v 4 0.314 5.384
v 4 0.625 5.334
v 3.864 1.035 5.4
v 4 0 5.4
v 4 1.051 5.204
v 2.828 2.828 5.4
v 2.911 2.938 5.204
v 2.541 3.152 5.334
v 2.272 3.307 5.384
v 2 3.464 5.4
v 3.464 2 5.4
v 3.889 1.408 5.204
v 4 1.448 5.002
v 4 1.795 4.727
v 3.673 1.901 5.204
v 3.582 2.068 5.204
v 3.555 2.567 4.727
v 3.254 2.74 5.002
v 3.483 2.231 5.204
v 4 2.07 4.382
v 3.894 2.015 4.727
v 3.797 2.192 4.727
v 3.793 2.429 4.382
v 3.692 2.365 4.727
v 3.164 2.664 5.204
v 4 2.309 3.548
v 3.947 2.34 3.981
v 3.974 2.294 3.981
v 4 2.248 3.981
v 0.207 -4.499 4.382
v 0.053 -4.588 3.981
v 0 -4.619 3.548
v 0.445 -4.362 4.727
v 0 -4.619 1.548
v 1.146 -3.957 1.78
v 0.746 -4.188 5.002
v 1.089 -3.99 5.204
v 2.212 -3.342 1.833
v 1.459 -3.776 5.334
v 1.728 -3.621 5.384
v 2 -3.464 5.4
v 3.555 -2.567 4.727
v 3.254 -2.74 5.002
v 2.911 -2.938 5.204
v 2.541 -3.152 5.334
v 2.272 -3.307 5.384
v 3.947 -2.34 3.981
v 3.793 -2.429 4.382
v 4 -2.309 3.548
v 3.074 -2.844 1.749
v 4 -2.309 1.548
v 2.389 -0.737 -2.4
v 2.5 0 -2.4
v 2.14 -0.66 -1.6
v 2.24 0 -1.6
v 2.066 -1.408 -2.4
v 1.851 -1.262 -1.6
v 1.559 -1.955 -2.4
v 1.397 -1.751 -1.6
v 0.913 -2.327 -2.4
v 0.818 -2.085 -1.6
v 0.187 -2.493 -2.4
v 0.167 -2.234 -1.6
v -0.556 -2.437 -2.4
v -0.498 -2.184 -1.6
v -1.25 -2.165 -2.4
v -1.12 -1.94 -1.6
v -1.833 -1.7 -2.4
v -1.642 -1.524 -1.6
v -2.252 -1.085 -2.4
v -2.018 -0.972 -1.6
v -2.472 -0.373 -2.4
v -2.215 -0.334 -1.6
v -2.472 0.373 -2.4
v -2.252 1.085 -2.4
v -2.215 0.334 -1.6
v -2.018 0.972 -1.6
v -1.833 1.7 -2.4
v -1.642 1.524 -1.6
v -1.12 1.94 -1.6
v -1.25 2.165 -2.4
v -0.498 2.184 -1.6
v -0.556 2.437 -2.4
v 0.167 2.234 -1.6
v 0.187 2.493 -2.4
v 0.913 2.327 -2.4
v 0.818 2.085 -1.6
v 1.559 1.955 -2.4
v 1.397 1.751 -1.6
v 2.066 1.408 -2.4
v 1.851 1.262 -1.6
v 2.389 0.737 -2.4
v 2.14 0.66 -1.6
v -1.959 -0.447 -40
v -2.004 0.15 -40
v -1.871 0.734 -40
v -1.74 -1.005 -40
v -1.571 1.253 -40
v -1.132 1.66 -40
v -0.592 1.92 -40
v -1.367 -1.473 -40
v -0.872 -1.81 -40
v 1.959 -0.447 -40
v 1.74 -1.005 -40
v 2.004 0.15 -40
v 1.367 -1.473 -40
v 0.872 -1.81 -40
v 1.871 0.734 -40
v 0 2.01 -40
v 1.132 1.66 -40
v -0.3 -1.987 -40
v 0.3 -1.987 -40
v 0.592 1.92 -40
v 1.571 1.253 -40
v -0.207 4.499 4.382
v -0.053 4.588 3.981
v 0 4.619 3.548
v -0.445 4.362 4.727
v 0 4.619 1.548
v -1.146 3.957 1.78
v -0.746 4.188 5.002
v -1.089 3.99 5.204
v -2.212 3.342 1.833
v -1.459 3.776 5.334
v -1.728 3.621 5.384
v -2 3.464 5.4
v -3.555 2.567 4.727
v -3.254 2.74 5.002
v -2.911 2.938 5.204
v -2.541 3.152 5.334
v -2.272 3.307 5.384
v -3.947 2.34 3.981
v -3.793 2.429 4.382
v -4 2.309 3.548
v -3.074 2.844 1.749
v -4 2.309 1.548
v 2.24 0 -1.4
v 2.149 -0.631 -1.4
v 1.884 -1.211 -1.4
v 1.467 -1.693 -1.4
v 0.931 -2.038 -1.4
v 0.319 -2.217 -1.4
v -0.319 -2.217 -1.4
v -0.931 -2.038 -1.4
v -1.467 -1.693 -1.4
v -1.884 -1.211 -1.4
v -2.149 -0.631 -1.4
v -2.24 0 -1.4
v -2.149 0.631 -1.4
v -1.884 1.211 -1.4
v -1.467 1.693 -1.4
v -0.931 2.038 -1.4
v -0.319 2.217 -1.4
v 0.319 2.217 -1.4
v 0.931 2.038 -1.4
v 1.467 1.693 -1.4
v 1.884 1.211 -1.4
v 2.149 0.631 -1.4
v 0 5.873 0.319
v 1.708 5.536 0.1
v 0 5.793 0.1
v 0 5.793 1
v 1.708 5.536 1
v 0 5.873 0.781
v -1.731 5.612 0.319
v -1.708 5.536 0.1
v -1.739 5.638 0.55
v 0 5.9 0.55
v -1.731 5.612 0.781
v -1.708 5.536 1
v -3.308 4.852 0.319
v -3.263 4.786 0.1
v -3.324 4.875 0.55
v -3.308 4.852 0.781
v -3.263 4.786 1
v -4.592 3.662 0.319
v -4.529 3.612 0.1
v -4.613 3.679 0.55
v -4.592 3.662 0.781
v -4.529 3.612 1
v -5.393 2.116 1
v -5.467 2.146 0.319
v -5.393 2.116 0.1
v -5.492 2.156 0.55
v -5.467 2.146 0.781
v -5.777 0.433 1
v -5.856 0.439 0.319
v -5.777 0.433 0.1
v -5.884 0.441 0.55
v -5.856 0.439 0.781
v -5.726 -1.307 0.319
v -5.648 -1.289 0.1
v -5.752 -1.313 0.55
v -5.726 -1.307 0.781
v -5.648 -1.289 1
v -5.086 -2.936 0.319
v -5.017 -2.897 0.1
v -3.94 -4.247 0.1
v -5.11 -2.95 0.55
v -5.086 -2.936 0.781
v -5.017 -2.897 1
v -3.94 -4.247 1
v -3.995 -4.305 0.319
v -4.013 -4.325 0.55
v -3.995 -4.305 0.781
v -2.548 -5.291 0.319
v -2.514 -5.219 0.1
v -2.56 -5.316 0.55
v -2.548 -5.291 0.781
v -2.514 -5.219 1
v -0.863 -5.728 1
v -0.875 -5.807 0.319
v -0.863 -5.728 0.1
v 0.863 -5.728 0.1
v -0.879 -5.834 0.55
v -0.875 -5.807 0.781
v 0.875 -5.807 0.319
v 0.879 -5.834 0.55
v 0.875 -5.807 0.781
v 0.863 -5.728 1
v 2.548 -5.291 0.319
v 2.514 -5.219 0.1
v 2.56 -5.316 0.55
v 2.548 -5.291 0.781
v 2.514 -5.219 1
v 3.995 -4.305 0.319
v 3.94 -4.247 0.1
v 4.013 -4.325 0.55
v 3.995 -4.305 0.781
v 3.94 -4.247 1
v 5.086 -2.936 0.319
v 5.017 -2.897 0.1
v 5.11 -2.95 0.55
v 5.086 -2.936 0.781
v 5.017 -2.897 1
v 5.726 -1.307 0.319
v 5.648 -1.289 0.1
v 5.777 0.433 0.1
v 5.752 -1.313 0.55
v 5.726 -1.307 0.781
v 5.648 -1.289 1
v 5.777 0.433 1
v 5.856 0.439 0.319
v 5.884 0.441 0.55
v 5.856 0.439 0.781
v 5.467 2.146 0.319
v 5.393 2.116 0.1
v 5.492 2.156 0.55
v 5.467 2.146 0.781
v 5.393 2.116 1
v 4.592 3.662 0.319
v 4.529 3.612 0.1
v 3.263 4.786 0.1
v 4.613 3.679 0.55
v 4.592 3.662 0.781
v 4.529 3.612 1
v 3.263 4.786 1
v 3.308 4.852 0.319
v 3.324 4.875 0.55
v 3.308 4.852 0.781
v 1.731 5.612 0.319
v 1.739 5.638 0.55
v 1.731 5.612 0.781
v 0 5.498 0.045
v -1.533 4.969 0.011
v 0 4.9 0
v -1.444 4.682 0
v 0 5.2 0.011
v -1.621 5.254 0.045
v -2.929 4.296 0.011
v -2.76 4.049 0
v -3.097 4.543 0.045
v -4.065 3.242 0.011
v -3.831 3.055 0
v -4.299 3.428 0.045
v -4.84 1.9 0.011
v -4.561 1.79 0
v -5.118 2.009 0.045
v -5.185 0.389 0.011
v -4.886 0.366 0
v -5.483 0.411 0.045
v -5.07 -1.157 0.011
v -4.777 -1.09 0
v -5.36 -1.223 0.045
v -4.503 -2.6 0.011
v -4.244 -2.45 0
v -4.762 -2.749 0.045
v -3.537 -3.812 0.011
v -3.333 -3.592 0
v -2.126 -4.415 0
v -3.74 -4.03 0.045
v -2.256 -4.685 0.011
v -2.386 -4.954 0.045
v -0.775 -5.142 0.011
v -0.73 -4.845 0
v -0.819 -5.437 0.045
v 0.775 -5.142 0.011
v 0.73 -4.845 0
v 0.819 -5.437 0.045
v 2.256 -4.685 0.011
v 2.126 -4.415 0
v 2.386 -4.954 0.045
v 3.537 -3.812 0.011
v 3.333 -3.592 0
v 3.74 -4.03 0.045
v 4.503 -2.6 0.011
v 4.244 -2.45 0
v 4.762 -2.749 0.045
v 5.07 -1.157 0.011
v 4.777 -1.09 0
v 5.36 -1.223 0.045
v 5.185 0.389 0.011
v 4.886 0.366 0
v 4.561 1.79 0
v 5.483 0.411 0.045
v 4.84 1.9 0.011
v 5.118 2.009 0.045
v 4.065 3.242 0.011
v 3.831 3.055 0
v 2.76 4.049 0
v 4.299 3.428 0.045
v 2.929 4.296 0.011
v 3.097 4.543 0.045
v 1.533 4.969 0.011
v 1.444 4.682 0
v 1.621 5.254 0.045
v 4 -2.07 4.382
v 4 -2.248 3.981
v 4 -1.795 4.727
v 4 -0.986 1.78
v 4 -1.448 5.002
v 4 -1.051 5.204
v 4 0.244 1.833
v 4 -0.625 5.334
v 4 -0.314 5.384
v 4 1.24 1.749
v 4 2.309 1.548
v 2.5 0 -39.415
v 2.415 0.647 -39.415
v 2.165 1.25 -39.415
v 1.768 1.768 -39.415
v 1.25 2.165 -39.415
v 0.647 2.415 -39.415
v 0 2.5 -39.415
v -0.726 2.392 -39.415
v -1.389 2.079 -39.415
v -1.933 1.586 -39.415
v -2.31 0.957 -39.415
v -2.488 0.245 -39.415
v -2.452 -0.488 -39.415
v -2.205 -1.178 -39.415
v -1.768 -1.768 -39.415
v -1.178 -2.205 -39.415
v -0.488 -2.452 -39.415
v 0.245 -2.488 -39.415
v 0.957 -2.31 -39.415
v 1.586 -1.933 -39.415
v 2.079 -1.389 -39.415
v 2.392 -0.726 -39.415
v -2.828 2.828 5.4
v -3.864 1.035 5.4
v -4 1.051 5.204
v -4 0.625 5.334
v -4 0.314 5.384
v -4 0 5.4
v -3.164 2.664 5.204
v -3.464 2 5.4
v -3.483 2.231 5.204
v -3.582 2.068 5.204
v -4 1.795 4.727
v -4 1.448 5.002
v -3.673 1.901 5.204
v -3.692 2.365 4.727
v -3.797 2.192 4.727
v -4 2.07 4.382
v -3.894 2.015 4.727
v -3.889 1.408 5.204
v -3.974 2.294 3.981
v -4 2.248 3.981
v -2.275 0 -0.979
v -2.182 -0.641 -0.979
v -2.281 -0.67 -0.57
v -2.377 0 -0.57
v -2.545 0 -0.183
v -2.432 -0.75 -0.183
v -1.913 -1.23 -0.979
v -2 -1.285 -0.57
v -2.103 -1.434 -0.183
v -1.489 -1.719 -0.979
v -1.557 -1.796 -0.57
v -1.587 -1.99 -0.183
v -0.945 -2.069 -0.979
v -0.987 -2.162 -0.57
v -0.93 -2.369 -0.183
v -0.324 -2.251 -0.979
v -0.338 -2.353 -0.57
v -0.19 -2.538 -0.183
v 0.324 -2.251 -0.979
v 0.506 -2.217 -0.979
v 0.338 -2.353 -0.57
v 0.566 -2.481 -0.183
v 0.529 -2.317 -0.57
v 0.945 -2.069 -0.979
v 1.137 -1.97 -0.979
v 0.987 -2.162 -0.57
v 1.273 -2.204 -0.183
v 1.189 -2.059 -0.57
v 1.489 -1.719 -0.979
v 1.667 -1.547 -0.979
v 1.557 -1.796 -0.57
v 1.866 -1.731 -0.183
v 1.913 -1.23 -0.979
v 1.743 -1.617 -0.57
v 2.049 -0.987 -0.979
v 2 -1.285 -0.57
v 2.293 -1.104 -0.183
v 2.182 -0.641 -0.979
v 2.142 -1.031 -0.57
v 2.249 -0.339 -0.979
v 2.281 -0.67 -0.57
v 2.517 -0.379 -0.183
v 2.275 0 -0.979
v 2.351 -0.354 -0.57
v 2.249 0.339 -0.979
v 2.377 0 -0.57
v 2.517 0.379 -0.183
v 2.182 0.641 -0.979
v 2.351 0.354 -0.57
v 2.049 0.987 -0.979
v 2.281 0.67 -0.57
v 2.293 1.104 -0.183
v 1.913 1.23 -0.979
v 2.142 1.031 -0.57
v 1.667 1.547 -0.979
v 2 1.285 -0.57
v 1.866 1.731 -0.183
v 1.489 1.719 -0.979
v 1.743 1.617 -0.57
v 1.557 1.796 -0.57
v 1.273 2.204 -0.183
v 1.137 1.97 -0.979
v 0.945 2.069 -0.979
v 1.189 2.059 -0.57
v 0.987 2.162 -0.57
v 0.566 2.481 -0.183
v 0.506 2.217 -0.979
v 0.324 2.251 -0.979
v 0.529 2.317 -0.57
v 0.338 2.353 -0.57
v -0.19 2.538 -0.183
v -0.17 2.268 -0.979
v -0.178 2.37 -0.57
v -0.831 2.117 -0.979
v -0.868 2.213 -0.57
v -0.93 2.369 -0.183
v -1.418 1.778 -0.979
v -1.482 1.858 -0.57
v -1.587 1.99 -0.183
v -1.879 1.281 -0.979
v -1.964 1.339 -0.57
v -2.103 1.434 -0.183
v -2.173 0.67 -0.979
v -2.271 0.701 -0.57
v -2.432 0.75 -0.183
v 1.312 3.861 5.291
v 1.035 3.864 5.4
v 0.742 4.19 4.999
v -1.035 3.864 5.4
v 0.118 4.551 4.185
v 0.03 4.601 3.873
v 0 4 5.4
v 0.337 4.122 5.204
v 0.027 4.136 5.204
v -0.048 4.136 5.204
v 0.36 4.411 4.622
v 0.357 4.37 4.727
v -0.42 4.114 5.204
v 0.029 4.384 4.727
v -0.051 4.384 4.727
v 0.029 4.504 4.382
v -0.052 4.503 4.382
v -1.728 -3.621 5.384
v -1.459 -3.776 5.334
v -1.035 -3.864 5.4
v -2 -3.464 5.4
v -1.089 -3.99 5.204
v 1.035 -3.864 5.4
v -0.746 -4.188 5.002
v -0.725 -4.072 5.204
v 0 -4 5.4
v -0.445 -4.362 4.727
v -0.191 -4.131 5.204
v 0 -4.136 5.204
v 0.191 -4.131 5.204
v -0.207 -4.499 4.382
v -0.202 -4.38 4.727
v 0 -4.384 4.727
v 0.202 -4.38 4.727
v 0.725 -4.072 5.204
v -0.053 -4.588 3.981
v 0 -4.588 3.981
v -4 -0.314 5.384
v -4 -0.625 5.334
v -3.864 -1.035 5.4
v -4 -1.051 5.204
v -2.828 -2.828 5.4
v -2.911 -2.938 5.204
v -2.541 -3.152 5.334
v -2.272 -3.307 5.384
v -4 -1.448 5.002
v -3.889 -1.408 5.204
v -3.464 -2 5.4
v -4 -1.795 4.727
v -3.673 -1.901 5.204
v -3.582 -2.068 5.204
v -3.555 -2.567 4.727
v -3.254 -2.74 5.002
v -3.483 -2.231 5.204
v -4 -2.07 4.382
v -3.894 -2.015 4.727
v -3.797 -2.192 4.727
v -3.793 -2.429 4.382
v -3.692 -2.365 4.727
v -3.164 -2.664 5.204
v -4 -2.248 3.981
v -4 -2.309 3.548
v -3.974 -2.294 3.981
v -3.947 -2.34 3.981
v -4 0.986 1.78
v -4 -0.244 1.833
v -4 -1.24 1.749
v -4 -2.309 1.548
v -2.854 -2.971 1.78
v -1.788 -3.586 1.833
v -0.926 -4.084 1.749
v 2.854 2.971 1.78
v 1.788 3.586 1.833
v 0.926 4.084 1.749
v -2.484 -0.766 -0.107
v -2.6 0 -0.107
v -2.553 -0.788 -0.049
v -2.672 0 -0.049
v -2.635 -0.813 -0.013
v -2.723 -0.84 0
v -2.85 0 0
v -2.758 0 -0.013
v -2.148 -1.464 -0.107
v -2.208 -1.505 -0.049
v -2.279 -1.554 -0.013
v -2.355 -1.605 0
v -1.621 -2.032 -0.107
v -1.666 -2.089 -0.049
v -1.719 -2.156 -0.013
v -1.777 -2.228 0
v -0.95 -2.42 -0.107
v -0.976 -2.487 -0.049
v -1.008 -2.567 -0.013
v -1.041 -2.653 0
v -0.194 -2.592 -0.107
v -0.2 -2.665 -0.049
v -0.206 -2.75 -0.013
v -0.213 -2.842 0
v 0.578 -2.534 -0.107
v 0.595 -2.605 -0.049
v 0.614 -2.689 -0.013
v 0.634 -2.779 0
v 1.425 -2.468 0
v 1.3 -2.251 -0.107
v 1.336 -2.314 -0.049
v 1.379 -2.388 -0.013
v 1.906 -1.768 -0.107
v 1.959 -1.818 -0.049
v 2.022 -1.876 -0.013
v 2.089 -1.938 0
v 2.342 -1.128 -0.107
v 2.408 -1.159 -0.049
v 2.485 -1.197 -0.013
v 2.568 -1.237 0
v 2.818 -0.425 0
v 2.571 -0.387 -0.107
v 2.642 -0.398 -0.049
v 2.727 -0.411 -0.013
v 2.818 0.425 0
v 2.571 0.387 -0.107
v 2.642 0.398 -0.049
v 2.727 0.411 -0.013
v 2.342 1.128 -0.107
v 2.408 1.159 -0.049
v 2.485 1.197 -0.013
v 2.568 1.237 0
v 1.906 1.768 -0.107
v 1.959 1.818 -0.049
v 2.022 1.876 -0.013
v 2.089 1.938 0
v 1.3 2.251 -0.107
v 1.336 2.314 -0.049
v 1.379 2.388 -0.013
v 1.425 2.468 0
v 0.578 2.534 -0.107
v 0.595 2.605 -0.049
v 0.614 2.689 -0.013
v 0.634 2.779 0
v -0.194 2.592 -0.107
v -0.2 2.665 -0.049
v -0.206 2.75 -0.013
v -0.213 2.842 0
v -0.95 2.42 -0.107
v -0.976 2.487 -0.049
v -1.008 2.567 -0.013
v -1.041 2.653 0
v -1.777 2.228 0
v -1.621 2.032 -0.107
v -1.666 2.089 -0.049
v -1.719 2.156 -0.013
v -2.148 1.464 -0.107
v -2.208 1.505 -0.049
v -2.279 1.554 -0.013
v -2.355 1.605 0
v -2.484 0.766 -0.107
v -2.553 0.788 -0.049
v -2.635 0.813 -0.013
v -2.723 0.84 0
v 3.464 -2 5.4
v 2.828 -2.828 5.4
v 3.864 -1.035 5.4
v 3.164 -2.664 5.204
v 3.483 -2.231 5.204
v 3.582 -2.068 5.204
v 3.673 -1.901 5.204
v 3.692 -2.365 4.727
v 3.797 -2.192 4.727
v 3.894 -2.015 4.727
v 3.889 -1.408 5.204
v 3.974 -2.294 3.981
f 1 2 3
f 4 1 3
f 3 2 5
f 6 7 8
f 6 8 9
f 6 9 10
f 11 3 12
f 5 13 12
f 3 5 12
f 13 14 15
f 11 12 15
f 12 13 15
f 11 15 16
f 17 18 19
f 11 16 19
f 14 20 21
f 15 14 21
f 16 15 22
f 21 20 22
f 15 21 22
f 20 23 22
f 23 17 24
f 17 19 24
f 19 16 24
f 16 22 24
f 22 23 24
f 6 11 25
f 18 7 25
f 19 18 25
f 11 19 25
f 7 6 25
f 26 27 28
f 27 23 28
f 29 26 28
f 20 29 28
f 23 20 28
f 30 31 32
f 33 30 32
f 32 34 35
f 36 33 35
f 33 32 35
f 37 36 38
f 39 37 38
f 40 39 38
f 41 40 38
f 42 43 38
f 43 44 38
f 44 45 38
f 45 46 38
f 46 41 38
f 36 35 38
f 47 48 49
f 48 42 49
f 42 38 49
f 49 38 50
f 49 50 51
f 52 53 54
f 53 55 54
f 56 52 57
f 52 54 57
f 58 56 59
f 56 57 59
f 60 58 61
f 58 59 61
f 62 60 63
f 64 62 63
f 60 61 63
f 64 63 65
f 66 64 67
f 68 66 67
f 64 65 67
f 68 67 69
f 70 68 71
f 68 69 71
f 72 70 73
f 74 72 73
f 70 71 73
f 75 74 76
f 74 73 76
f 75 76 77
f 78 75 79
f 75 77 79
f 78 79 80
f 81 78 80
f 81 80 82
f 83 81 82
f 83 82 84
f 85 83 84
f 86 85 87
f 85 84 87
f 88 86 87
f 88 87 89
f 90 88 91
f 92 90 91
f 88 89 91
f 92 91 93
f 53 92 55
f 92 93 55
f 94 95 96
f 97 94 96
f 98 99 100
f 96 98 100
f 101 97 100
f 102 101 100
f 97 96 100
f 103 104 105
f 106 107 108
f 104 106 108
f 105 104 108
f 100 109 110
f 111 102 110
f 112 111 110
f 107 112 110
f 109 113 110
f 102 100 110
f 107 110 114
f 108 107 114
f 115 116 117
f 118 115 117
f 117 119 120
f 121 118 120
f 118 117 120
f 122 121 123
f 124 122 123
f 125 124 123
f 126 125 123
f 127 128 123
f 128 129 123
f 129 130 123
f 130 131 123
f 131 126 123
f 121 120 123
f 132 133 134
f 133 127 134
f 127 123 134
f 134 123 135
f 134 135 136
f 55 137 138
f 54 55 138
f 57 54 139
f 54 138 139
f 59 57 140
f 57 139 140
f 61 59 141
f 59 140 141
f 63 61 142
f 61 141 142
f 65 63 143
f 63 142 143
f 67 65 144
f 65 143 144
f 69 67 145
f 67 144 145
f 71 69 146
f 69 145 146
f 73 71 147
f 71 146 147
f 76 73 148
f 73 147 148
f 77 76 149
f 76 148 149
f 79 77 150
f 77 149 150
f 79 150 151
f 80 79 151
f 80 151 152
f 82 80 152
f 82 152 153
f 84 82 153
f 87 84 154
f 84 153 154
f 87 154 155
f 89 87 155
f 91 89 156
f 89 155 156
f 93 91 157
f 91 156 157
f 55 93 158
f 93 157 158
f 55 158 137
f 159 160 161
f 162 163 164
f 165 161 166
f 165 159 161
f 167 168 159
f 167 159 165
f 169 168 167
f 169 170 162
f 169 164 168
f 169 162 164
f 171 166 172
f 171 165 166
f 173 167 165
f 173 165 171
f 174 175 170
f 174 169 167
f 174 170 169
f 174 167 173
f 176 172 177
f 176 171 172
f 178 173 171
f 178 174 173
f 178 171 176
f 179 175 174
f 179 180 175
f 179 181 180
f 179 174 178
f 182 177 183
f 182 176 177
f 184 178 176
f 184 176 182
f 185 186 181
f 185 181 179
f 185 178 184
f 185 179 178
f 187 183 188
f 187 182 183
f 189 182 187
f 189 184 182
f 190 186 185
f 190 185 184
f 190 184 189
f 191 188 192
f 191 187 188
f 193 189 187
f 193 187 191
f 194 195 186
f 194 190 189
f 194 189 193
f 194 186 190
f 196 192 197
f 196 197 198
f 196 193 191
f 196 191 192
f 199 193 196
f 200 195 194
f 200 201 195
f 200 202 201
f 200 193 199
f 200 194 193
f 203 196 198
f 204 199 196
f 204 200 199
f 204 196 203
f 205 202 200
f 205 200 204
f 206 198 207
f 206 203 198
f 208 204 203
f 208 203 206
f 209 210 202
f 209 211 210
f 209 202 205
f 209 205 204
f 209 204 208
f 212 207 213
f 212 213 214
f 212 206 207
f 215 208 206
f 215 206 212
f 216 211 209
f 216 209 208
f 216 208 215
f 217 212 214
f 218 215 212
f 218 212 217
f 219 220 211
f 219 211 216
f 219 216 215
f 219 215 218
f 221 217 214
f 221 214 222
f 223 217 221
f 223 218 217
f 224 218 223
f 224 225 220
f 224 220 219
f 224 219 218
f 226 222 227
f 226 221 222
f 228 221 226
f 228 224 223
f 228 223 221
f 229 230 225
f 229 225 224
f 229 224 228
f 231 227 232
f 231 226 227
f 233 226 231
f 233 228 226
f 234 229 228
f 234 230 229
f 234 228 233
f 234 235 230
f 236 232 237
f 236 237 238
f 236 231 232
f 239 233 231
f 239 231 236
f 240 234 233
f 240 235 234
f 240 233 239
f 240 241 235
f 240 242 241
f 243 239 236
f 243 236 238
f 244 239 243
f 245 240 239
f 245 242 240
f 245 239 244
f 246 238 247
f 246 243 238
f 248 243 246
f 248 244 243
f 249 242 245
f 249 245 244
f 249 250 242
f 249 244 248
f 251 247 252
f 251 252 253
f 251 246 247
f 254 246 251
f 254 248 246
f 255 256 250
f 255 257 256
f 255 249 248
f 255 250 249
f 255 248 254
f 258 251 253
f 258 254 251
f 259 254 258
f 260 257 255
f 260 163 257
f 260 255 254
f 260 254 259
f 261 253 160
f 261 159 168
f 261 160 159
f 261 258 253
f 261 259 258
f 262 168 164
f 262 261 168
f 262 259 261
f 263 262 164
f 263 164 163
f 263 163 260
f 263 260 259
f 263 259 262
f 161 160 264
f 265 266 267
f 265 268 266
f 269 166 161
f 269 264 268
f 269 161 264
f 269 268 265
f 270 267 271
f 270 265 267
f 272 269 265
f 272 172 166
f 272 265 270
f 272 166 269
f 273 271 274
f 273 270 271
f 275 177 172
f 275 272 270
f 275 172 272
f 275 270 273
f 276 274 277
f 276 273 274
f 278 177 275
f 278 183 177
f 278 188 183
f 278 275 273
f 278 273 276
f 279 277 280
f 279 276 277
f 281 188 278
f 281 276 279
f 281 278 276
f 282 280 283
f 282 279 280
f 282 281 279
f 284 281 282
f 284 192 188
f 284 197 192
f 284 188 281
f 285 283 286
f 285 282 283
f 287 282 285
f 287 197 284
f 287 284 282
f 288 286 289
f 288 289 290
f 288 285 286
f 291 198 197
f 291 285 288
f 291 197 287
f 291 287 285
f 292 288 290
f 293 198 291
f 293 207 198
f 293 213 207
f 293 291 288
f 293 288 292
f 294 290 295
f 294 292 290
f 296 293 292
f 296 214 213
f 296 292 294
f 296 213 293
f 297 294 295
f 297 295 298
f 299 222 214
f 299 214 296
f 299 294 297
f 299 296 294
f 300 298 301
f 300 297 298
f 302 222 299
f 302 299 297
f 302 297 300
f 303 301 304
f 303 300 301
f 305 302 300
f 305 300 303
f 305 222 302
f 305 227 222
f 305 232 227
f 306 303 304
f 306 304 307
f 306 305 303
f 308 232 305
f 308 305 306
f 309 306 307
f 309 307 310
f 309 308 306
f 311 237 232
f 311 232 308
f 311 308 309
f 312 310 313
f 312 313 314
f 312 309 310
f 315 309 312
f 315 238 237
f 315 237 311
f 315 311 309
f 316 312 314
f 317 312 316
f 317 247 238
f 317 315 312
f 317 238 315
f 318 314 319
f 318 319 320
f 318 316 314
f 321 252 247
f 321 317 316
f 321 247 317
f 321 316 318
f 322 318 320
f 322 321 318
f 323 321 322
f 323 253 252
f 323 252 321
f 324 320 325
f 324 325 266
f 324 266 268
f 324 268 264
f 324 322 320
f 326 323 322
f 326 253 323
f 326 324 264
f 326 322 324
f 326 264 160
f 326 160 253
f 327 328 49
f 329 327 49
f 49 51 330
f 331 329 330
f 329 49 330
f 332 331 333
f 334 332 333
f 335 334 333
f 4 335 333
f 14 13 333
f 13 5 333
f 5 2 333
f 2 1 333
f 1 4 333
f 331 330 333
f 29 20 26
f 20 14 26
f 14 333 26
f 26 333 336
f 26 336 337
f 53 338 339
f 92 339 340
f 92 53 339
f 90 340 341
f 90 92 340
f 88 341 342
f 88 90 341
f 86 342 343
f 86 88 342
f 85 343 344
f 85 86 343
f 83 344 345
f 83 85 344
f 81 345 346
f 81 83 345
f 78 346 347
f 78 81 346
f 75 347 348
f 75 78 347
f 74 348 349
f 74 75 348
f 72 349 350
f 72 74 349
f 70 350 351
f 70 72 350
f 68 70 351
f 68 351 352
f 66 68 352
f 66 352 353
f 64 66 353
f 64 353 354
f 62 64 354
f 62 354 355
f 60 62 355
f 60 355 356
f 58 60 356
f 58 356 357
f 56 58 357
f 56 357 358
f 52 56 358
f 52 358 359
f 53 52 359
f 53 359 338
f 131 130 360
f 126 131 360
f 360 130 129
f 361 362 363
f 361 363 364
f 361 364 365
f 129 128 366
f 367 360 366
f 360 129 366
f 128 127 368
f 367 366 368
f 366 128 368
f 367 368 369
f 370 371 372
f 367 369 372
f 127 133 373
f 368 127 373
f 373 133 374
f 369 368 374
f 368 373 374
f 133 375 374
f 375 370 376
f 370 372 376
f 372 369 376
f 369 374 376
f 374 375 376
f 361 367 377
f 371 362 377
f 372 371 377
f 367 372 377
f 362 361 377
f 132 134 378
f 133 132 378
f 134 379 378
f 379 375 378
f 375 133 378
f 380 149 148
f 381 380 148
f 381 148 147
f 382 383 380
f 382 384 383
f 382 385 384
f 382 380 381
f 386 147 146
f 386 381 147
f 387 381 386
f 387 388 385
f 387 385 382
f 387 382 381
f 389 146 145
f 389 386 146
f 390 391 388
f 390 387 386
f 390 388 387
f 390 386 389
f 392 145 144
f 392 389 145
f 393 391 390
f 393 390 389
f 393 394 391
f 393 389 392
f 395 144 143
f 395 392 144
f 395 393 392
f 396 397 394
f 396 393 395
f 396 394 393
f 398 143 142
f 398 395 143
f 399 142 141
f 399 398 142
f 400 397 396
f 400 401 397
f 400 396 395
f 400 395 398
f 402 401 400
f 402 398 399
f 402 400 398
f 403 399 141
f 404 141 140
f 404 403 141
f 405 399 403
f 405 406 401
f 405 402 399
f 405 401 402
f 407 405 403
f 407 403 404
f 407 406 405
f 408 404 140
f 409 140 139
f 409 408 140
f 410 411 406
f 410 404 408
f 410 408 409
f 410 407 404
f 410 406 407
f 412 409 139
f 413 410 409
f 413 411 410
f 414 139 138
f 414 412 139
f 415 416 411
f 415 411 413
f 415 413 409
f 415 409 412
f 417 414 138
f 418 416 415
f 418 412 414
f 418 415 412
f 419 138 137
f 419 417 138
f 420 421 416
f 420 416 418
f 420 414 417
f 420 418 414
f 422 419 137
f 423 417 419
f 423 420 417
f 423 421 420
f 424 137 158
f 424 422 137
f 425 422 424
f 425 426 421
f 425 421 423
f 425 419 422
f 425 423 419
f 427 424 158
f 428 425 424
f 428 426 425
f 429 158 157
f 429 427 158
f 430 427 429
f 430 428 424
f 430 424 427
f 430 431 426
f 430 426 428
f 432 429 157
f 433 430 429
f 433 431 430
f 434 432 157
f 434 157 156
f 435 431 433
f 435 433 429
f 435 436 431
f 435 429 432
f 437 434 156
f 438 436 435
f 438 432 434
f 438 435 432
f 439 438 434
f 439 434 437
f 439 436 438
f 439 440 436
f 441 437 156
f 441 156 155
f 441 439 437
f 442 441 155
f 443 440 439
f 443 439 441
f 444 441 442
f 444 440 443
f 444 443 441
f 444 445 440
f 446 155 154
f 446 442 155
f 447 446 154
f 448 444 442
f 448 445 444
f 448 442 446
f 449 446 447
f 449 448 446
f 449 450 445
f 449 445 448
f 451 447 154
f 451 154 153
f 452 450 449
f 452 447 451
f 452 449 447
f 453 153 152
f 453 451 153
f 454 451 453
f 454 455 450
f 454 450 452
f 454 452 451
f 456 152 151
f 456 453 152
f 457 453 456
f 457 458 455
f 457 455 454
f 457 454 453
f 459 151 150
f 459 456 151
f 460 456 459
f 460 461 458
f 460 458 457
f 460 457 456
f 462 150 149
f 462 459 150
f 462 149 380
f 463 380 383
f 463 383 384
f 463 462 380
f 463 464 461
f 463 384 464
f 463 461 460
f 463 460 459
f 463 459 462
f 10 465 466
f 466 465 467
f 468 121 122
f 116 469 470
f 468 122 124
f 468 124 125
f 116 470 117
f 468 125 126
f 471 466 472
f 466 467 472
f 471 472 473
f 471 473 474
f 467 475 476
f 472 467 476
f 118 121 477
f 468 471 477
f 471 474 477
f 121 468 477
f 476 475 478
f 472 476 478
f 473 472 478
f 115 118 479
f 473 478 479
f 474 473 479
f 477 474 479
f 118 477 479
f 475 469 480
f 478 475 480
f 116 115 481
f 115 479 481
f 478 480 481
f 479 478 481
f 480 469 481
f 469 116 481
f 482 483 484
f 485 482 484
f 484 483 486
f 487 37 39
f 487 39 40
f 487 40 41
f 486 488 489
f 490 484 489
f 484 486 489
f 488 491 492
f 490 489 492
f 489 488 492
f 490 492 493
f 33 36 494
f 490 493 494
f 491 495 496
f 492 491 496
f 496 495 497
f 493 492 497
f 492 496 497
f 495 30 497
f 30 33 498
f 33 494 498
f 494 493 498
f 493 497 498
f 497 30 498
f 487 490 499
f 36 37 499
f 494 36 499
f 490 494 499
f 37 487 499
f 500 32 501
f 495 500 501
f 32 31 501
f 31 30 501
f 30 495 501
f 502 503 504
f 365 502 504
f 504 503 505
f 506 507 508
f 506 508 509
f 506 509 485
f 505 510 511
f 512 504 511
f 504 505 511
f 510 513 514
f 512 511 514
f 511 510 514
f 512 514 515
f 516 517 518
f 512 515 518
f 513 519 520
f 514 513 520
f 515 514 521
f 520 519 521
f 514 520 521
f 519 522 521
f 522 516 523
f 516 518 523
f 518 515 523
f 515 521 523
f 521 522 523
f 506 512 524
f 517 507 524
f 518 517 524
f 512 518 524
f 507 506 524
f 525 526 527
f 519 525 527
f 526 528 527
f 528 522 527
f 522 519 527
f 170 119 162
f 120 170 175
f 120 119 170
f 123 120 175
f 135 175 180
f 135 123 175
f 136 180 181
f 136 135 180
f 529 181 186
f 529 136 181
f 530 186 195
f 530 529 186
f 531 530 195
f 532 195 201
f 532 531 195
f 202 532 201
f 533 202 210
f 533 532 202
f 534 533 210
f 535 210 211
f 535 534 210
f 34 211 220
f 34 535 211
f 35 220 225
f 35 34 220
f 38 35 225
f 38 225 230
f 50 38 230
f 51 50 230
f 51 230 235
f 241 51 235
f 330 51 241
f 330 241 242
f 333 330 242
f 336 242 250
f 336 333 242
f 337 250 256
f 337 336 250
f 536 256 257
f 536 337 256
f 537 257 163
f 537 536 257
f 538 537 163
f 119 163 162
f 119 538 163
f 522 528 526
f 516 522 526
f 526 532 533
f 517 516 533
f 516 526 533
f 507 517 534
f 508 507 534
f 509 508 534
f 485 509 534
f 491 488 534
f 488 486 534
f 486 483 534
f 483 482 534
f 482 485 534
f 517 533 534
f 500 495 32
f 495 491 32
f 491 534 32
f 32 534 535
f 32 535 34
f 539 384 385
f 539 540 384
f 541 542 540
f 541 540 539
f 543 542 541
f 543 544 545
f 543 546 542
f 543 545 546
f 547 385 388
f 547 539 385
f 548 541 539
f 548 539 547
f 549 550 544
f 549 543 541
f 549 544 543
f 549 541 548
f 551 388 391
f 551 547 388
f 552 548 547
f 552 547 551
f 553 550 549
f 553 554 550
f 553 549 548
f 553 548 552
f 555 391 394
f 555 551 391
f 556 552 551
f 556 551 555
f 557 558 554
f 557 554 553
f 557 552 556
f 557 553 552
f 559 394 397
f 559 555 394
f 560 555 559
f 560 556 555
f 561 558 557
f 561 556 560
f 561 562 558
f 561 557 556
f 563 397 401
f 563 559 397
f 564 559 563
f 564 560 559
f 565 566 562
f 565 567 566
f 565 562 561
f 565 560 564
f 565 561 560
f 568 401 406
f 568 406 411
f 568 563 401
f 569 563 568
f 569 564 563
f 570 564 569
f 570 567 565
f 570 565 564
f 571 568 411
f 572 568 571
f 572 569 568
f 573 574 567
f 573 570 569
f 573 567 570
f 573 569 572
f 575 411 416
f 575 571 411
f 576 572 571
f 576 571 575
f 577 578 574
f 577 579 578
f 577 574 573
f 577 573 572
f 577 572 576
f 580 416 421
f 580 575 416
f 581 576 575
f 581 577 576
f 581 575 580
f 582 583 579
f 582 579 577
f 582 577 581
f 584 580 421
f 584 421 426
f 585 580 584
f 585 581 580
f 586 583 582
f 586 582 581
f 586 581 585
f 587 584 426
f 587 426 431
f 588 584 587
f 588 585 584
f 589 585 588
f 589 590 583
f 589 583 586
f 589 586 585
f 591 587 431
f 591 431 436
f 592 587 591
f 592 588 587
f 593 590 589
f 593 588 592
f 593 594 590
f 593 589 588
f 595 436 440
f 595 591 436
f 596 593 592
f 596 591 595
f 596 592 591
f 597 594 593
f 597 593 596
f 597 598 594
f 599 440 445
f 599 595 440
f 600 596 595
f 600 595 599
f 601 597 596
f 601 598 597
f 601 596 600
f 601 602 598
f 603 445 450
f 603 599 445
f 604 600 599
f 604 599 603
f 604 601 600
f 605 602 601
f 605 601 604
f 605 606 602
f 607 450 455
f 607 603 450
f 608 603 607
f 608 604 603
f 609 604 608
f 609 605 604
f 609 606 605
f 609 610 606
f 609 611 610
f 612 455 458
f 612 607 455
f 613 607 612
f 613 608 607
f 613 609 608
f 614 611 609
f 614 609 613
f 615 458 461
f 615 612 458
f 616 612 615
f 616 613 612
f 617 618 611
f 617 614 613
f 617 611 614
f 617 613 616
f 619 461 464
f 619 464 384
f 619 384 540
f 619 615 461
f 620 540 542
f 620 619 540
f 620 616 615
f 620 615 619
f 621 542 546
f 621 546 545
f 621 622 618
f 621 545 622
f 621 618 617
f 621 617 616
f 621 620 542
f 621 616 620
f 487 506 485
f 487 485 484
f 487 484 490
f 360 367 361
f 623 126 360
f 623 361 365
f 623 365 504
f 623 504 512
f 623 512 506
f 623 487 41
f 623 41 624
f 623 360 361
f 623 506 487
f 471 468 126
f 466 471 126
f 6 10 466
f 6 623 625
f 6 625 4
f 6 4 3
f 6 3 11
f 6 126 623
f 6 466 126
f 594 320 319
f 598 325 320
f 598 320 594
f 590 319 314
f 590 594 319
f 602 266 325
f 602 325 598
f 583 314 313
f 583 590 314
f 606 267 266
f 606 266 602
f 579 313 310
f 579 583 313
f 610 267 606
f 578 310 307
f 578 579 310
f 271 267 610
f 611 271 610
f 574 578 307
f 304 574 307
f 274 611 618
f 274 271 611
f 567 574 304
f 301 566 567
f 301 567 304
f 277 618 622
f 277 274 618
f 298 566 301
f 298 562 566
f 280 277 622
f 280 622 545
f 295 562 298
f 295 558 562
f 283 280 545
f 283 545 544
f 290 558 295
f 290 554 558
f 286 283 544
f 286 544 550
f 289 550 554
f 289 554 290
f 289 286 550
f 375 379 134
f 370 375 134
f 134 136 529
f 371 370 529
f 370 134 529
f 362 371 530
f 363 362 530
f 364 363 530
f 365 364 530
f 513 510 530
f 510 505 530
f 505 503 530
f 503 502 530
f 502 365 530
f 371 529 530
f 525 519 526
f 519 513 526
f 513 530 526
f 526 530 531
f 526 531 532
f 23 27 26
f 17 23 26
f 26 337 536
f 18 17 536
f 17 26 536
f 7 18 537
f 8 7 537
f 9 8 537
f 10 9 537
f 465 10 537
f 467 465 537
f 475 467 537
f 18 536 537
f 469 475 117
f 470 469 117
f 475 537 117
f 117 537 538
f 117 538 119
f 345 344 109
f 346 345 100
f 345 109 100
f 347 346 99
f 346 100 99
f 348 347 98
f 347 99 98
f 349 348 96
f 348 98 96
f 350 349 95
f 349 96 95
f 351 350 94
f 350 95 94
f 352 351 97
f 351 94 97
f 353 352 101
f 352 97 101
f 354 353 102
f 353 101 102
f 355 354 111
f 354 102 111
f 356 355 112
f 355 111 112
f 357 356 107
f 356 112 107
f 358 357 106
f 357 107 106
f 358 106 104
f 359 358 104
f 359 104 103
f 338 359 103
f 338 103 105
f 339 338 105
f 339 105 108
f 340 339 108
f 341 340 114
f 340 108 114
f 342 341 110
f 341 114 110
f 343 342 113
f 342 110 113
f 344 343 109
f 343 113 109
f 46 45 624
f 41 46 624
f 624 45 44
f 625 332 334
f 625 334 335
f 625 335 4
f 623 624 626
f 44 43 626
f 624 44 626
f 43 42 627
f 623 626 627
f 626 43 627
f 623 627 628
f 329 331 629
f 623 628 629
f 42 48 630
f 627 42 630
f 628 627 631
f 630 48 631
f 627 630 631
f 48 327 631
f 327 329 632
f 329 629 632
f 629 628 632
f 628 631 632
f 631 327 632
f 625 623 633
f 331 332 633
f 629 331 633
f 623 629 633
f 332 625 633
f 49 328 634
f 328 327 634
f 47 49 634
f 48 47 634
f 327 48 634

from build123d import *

# Parameters (mm, degrees)
HEAD_BOSS_EXTRUDE1_DEPTH   = 5.4
SKETCH11_R                 = 2.5
LENGTH_BOSS_EXTRUDE2_DEPTH = 40


with BuildPart() as part:
    # Sketch8 → head-Boss-Extrude1 (new body)
    with BuildSketch(Plane.XY):
        Polygon((0, 4.618802154), (-4, 2.309401077), (-4, -2.309401077), (0, -4.618802154), (4, -2.309401077), (4, 2.309401077), align=None)
    extrude(amount=HEAD_BOSS_EXTRUDE1_DEPTH)

    # Sketch9 → k'-Cut-Revolve1 (revolve, cut)
    with BuildSketch(Plane(origin=(0, 0, 0), x_dir=(0, 0, -1), z_dir=(1, 0, 0))):
        with BuildLine():
            Line((-5.4, 4.618802154), (-5.4, 4))
            ThreePointArc((-5.4, 4), (-4.524086001, 4.460011199), (-3.547550763, 4.618802154))
            Line((-3.547550763, 4.618802154), (-5.4, 4.618802154))
        make_face()
    revolve(axis=Axis((0, 0, 0), (0, 0, 1)), mode=Mode.SUBTRACT)

    # Sketch10 → flange-Revolve1 (revolve)
    with BuildSketch(Plane(origin=(0, 0, 0), x_dir=(0, 0, -1), z_dir=(1, 0, 0))):
        with BuildLine():
            Line((-1, 5.793028555), (-2.535564434, 2.5))
            Line((-2.535564434, 2.5), (0, 2.5))
            Line((0, 2.5), (0, 4.9))
            ThreePointArc((0, 4.9), (-0.025077882, 5.349305019), (-0.1, 5.793028555))
            ThreePointArc((-0.1, 5.793028555), (-0.55, 5.9), (-1, 5.793028555))
        make_face()
    revolve(axis=Axis((0, 0, 0), (0, 0, 1)))

    # Sketch11 → length-Boss-Extrude2 (add)
    with BuildSketch(Plane.XY):
        Circle(SKETCH11_R)
    extrude(amount=-LENGTH_BOSS_EXTRUDE2_DEPTH)

    # Sketch12 → thread-Cut-Revolve3 (revolve, cut)
    with BuildSketch(Plane(origin=(0, 0, 0), x_dir=(0, 0, -1), z_dir=(1, 0, 0)), mode=Mode.PRIVATE) as thread_cut_revolve3_sk:
        Polygon((1.6, 2.24), (0, 2.24), (0, 2.5), (2.4, 2.5), align=None)
    revolve(thread_cut_revolve3_sk.sketch.rotate(Axis((0, 0, 0), (0, 0, -1)), 90), axis=Axis((0, 0, 0), (0, 0, -1)), mode=Mode.SUBTRACT)

    # Sketch13 → chamfer-Cut-Revolve4 (revolve, cut)
    with BuildSketch(Plane(origin=(0, 0, 0), x_dir=(0, 0, -1), z_dir=(1, 0, 0))):
        Polygon((40, 2.0095), (40, 2.5), (39.415444863, 2.5), align=None)
    revolve(axis=Axis((0, 0, -40), (0, 0, 1)), mode=Mode.SUBTRACT)

    # Sketch15 → coarse-fillet-Revolve2 (revolve)
    with BuildSketch(Plane(origin=(0, 0, 0), x_dir=(0, 0, -1), z_dir=(1, 0, 0)), mode=Mode.PRIVATE) as coarse_fillet_revolve2_sk:
        with BuildLine():
            Line((0, 2.24), (1.4, 2.24))
            ThreePointArc((1.4, 2.24), (0.77257354, 2.31741069), (0.182777402, 2.545))
            ThreePointArc((0.182777402, 2.545), (0.049192715, 2.672213204), (0, 2.85))
            Line((0, 2.85), (0, 2.24))
        make_face()
    revolve(coarse_fillet_revolve2_sk.sketch.rotate(Axis((0, 0, -40), (0, 0, 1)), 90), axis=Axis((0, 0, -40), (0, 0, 1)))


solid = part.part
